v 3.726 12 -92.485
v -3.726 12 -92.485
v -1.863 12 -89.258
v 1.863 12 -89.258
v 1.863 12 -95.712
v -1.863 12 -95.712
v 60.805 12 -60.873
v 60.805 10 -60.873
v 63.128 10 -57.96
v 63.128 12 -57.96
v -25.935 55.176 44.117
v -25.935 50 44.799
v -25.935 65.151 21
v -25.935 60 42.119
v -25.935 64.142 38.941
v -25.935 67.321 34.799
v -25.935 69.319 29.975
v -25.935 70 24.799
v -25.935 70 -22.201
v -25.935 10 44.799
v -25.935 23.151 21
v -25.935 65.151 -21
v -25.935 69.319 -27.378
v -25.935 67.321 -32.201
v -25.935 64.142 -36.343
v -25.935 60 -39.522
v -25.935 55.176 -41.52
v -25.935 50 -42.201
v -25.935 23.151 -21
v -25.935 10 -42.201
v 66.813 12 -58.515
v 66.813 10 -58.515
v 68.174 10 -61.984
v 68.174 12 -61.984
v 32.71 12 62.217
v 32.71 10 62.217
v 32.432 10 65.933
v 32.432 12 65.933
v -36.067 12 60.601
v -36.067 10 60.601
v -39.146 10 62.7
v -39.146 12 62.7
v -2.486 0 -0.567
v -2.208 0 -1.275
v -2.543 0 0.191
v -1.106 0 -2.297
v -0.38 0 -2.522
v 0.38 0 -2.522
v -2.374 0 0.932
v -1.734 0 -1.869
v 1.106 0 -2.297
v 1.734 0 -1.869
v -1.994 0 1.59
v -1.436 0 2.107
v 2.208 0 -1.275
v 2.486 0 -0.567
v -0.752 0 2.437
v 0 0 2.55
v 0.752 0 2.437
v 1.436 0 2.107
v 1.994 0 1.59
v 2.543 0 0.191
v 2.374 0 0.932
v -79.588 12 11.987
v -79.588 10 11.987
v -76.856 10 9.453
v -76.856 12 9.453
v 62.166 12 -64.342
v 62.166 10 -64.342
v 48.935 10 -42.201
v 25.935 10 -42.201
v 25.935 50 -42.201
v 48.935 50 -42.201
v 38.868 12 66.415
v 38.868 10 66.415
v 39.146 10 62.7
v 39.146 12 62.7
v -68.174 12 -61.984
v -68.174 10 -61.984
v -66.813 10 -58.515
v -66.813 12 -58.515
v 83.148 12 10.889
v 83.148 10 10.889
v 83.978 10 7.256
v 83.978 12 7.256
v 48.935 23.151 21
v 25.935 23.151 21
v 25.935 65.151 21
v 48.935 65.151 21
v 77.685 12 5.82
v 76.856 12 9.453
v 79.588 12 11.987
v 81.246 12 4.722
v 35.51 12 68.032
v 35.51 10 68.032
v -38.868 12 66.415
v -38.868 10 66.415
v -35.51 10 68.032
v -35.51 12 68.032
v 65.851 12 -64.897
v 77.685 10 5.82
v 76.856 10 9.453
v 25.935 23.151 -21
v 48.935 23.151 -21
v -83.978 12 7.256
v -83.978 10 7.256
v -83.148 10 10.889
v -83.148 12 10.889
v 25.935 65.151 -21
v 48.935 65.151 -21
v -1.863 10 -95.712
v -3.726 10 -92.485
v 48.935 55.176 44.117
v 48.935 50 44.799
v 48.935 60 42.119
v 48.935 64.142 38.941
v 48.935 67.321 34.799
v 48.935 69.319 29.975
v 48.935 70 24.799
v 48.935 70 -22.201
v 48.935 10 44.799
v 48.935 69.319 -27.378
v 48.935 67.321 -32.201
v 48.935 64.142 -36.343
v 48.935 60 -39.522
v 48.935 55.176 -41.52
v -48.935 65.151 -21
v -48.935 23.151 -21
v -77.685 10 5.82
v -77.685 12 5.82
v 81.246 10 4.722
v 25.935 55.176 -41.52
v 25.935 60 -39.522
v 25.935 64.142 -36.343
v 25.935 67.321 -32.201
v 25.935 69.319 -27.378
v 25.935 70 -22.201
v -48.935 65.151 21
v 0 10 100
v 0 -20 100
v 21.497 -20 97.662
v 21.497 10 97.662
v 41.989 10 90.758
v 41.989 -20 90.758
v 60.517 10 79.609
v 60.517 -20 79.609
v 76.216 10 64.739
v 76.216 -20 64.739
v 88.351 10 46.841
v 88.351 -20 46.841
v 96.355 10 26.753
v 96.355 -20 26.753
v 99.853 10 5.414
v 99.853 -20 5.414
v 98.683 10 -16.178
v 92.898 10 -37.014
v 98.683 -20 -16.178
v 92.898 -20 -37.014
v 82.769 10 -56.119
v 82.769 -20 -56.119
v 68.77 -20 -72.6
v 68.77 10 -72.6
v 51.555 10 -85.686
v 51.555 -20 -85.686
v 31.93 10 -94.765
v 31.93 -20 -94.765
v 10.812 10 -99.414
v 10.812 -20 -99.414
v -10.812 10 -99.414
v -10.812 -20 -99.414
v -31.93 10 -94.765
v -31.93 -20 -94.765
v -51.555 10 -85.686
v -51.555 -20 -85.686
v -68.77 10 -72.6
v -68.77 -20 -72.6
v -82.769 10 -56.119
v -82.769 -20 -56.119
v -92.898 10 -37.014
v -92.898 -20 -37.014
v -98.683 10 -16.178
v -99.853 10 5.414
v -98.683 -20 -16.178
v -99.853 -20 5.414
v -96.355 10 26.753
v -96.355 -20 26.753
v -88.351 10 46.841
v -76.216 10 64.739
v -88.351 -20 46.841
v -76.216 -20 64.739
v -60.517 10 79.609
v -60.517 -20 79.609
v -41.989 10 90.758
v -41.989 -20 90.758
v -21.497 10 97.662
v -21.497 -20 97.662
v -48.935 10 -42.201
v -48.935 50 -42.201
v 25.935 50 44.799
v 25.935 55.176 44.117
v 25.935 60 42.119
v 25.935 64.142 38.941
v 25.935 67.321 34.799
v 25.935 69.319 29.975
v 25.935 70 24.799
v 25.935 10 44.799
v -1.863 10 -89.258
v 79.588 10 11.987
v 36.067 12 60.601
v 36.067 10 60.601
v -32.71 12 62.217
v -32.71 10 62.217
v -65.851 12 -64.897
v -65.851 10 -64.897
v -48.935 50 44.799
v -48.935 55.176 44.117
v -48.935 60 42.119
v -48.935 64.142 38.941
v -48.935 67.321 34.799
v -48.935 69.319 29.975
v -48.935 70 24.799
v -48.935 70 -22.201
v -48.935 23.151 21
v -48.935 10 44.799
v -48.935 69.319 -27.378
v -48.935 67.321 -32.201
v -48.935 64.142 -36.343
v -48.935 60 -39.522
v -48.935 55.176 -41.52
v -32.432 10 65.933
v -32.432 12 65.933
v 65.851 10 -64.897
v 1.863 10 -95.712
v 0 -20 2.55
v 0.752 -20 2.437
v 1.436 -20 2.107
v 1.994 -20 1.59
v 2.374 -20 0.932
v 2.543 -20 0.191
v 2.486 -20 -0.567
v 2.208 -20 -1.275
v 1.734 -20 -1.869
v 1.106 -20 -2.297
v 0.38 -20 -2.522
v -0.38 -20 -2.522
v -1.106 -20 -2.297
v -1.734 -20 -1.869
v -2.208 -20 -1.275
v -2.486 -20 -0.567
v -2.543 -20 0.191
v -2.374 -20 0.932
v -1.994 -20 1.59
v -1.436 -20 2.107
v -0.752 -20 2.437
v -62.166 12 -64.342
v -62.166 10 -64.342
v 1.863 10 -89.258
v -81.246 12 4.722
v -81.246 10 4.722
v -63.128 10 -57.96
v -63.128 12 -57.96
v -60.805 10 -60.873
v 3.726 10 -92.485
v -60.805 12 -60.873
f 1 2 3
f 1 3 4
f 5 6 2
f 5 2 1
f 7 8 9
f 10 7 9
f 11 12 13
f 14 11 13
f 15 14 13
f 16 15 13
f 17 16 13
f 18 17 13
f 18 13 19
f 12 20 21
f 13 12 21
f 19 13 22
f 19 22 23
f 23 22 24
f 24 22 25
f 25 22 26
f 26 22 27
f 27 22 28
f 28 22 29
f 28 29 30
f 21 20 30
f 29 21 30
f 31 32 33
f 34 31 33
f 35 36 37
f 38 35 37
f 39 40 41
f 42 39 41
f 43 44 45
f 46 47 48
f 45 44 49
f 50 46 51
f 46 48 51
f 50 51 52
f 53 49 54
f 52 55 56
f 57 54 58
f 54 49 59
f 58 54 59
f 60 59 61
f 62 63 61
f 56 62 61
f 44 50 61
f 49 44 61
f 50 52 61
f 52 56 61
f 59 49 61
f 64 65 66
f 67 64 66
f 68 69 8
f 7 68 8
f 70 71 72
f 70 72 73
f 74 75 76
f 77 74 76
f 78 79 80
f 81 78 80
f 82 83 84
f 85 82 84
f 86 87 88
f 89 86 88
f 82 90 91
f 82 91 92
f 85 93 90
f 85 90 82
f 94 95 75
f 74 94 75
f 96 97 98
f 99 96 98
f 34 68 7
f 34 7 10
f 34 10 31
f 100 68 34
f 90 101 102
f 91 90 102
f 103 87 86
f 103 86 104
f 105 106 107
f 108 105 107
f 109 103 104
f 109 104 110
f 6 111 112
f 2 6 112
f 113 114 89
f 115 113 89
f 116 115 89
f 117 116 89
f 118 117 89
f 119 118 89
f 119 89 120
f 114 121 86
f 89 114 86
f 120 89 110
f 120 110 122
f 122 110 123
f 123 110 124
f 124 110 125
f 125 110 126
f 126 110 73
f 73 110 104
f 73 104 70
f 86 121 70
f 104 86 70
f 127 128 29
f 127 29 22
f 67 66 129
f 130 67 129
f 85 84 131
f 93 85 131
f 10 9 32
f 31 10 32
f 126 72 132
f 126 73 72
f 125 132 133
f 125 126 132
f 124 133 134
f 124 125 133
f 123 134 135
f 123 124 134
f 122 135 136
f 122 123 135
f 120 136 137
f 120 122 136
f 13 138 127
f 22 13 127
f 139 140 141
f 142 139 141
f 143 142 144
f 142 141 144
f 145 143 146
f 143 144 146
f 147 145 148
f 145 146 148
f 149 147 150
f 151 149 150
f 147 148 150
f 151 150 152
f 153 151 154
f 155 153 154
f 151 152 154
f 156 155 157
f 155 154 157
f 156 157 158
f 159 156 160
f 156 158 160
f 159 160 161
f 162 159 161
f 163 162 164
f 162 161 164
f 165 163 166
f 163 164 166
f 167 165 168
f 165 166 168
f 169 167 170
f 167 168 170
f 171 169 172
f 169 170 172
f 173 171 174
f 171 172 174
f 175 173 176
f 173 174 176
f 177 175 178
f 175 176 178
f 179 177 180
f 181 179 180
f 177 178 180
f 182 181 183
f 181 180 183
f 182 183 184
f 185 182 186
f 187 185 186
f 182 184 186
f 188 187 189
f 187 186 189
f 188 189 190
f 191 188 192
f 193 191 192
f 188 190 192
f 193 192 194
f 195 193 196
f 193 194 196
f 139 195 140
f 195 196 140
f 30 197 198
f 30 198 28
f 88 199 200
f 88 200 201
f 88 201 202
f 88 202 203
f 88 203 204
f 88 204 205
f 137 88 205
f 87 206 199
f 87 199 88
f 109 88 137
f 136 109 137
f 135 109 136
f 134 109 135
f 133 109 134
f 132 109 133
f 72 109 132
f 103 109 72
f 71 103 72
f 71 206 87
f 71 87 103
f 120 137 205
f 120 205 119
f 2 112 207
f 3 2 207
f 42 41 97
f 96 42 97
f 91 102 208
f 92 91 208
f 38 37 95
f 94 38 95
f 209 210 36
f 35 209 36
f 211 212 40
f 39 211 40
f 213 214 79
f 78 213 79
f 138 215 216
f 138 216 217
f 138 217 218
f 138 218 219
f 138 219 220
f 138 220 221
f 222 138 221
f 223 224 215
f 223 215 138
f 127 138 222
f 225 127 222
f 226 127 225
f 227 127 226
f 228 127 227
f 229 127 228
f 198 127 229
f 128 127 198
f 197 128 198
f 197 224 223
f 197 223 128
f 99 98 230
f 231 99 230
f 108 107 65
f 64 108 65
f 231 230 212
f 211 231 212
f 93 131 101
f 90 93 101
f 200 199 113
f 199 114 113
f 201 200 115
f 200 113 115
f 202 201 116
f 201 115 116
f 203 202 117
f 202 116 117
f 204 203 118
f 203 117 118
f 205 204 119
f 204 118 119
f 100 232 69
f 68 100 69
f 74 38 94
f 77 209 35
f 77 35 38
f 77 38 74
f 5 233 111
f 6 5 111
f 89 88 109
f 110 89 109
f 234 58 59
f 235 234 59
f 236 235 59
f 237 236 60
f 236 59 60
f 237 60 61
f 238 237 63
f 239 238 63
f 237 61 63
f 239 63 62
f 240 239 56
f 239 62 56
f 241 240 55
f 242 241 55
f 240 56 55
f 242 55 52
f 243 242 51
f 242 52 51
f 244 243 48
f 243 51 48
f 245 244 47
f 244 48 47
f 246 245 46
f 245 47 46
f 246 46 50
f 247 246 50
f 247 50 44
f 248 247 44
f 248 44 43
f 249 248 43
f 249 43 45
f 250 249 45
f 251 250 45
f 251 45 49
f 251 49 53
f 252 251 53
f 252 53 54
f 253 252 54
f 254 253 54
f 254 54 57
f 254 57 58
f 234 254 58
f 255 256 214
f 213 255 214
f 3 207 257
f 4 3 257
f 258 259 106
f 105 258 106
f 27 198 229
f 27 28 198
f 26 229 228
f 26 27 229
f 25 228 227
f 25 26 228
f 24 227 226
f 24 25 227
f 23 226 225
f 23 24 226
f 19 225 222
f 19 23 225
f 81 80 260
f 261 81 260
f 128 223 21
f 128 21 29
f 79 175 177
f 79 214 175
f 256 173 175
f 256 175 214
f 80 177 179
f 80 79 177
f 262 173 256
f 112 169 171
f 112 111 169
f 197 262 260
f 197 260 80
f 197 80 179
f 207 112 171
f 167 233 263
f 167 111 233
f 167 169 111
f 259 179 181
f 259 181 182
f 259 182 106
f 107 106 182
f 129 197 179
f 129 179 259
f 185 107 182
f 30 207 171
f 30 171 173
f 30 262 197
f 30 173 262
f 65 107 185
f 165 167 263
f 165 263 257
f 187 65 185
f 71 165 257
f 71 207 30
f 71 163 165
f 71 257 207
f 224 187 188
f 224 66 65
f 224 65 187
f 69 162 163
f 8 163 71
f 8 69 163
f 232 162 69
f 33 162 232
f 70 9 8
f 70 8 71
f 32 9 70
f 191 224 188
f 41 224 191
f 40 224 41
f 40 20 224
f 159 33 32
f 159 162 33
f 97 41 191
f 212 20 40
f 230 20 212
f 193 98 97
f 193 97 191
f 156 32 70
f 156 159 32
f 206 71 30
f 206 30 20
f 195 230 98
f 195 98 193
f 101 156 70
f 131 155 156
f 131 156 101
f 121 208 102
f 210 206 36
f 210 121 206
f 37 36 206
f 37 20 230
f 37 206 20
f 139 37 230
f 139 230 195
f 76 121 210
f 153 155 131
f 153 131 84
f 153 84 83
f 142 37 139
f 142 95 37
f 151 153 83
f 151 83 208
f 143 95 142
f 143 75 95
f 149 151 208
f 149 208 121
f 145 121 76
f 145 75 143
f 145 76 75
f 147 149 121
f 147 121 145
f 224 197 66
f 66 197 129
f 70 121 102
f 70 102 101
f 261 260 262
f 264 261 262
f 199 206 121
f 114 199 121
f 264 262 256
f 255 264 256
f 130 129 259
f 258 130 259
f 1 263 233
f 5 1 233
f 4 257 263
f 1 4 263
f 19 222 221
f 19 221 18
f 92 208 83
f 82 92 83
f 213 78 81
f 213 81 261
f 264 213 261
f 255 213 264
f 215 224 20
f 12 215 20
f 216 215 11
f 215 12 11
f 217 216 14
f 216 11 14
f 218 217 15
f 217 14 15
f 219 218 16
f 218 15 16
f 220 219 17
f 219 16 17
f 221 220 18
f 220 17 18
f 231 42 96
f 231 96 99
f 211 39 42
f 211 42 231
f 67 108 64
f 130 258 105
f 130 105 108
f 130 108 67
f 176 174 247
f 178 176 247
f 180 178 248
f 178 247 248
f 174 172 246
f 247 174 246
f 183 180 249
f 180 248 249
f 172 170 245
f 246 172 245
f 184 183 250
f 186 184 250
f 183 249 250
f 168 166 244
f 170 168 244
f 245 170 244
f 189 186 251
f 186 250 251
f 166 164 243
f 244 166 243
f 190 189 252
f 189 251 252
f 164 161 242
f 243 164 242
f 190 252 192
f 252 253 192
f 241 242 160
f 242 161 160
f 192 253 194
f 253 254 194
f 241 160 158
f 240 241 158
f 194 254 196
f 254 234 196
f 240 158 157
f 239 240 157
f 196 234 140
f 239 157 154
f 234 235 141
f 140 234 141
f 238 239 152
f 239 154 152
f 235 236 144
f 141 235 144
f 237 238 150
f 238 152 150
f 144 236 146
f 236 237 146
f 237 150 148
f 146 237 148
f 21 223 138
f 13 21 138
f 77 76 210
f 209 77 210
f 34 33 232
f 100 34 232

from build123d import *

# Parameters (mm, degrees)
Y_KSEKLIK_EKSTR_ZYON1_DEPTH      = 10
Y_KSEKLIK_EKSTR_ZYON1_DEPTH_BACK = 20
IZIM1_R                          = 100
IZIM4_R                          = 2.55
KES_EKSTR_ZYON4_DEPTH            = 20.2
IZIM8_W                          = 23
IZIM8_H                          = 87
Y_KSEKLIK_EKSTR_ZYON5_DEPTH      = 70
KES_EKSTR_ZYON6_DEPTH            = 60
KES_EKSTR_ZYON6_DEPTH_BACK       = 60
IZIM9_W                          = 42
IZIM9_H                          = 42
Y_KSEKLIK_EKSTR_ZYON6_DEPTH      = 2
RADYUS1_R                        = 20


with BuildPart() as part:
    # Çizim1 → Yükseklik-Ekstrüzyon1 (new, two sides: drawn at the far end of the back side and taken through both)
    with BuildSketch(Plane(origin=(0, 0, 0), x_dir=(1, 0, 0), z_dir=(0, 1, 0)).offset(-Y_KSEKLIK_EKSTR_ZYON1_DEPTH_BACK)):
        with Locations(Location((0, 0, 0), (0, 0, 270))):
            Circle(IZIM1_R)
    extrude(amount=Y_KSEKLIK_EKSTR_ZYON1_DEPTH + Y_KSEKLIK_EKSTR_ZYON1_DEPTH_BACK)

    # Çizim4 → Kes-Ekstrüzyon4 (cut)
    with BuildSketch(Plane(origin=(0, 0, 0), x_dir=(1, 0, 0), z_dir=(0, 1, 0))):
        with Locations(Location((0, 0, 0), (0, 0, 270))):
            Circle(IZIM4_R)
    extrude(amount=-KES_EKSTR_ZYON4_DEPTH, mode=Mode.SUBTRACT)

    # Çizim8 → Yükseklik-Ekstrüzyon5 (add)
    with BuildSketch(Plane(origin=(0, 0, 0), x_dir=(1, 0, 0), z_dir=(0, 1, 0))):
        with Locations((-37.434640227, -1.29867582)):
            Rectangle(IZIM8_W, IZIM8_H)
        with Locations((37.434640227, -1.29867582)):
            Rectangle(IZIM8_W, IZIM8_H)
    extrude(amount=Y_KSEKLIK_EKSTR_ZYON5_DEPTH)

    # Çizim9 → Kes-Ekstrüzyon6 (cut, two sides: drawn at the far end of the back side and taken through both)
    with BuildSketch(Plane(origin=(0, 0, 0), x_dir=(0, 0, -1), z_dir=(1, 0, 0)).offset(-KES_EKSTR_ZYON6_DEPTH_BACK)):
        with Locations((0, 44.15078082)):
            Rectangle(IZIM9_W, IZIM9_H)
    extrude(amount=KES_EKSTR_ZYON6_DEPTH + KES_EKSTR_ZYON6_DEPTH_BACK, mode=Mode.SUBTRACT)

    # Çizim10 → Yükseklik-Ekstrüzyon6 (add)
    with BuildSketch(Plane(origin=(0, 10, 0), x_dir=(1, 0, 0), z_dir=(0, 1, 0))):
        Polygon((66.812616777, 58.515280774), (68.173954633, 61.983913061), (65.850699884, 64.897182371), (62.166107279, 64.341819393), (60.804769424, 60.873187106), (63.128024173, 57.959917797), align=None)
        Polygon((3.726211306, 92.48499002), (1.863105653, 95.711983671), (-1.863105653, 95.711983671), (-3.726211306, 92.48499002), (-1.863105653, 89.257996369), (1.863105653, 89.257996369), align=None)
        Polygon((79.587759086, -11.987424426), (83.148425279, -10.889104362), (83.977585299, -7.256316953), (81.246079126, -4.721849607), (77.685412933, -5.820169671), (76.856252913, -9.45295708), align=None)
        Polygon((32.431695509, -65.933150571), (35.510435771, -68.032200141), (38.867636153, -66.415457646), (39.146096273, -62.699665583), (36.06735601, -60.600616013), (32.710155628, -62.217358508), align=None)
        Polygon((-39.146096273, -62.699665583), (-38.867636153, -66.415457646), (-35.510435771, -68.032200141), (-32.431695509, -65.933150571), (-32.710155628, -62.217358508), (-36.06735601, -60.600616013), align=None)
        Polygon((-81.246079126, -4.721849607), (-83.977585299, -7.256316953), (-83.148425279, -10.889104362), (-79.587759086, -11.987424426), (-76.856252913, -9.45295708), (-77.685412933, -5.820169671), align=None)
        Polygon((-62.166107279, 64.341819393), (-65.850699884, 64.89718237), (-68.173954633, 61.983913061), (-66.812616777, 58.515280774), (-63.128024173, 57.959917797), (-60.804769424, 60.873187106), align=None)
    extrude(amount=Y_KSEKLIK_EKSTR_ZYON6_DEPTH)

    # Radyus1
    radyus1_edges = [part.edges().sort_by_distance(p)[0] for p in [
        (-37.434640227, 70, -42.20132418),
        (-37.434640227, 70, 44.79867582),
        (37.434640227, 70, -42.20132418),
        (37.434640227, 70, 44.79867582),
    ]]
    fillet(radyus1_edges, radius=RADYUS1_R)


solid = part.part
